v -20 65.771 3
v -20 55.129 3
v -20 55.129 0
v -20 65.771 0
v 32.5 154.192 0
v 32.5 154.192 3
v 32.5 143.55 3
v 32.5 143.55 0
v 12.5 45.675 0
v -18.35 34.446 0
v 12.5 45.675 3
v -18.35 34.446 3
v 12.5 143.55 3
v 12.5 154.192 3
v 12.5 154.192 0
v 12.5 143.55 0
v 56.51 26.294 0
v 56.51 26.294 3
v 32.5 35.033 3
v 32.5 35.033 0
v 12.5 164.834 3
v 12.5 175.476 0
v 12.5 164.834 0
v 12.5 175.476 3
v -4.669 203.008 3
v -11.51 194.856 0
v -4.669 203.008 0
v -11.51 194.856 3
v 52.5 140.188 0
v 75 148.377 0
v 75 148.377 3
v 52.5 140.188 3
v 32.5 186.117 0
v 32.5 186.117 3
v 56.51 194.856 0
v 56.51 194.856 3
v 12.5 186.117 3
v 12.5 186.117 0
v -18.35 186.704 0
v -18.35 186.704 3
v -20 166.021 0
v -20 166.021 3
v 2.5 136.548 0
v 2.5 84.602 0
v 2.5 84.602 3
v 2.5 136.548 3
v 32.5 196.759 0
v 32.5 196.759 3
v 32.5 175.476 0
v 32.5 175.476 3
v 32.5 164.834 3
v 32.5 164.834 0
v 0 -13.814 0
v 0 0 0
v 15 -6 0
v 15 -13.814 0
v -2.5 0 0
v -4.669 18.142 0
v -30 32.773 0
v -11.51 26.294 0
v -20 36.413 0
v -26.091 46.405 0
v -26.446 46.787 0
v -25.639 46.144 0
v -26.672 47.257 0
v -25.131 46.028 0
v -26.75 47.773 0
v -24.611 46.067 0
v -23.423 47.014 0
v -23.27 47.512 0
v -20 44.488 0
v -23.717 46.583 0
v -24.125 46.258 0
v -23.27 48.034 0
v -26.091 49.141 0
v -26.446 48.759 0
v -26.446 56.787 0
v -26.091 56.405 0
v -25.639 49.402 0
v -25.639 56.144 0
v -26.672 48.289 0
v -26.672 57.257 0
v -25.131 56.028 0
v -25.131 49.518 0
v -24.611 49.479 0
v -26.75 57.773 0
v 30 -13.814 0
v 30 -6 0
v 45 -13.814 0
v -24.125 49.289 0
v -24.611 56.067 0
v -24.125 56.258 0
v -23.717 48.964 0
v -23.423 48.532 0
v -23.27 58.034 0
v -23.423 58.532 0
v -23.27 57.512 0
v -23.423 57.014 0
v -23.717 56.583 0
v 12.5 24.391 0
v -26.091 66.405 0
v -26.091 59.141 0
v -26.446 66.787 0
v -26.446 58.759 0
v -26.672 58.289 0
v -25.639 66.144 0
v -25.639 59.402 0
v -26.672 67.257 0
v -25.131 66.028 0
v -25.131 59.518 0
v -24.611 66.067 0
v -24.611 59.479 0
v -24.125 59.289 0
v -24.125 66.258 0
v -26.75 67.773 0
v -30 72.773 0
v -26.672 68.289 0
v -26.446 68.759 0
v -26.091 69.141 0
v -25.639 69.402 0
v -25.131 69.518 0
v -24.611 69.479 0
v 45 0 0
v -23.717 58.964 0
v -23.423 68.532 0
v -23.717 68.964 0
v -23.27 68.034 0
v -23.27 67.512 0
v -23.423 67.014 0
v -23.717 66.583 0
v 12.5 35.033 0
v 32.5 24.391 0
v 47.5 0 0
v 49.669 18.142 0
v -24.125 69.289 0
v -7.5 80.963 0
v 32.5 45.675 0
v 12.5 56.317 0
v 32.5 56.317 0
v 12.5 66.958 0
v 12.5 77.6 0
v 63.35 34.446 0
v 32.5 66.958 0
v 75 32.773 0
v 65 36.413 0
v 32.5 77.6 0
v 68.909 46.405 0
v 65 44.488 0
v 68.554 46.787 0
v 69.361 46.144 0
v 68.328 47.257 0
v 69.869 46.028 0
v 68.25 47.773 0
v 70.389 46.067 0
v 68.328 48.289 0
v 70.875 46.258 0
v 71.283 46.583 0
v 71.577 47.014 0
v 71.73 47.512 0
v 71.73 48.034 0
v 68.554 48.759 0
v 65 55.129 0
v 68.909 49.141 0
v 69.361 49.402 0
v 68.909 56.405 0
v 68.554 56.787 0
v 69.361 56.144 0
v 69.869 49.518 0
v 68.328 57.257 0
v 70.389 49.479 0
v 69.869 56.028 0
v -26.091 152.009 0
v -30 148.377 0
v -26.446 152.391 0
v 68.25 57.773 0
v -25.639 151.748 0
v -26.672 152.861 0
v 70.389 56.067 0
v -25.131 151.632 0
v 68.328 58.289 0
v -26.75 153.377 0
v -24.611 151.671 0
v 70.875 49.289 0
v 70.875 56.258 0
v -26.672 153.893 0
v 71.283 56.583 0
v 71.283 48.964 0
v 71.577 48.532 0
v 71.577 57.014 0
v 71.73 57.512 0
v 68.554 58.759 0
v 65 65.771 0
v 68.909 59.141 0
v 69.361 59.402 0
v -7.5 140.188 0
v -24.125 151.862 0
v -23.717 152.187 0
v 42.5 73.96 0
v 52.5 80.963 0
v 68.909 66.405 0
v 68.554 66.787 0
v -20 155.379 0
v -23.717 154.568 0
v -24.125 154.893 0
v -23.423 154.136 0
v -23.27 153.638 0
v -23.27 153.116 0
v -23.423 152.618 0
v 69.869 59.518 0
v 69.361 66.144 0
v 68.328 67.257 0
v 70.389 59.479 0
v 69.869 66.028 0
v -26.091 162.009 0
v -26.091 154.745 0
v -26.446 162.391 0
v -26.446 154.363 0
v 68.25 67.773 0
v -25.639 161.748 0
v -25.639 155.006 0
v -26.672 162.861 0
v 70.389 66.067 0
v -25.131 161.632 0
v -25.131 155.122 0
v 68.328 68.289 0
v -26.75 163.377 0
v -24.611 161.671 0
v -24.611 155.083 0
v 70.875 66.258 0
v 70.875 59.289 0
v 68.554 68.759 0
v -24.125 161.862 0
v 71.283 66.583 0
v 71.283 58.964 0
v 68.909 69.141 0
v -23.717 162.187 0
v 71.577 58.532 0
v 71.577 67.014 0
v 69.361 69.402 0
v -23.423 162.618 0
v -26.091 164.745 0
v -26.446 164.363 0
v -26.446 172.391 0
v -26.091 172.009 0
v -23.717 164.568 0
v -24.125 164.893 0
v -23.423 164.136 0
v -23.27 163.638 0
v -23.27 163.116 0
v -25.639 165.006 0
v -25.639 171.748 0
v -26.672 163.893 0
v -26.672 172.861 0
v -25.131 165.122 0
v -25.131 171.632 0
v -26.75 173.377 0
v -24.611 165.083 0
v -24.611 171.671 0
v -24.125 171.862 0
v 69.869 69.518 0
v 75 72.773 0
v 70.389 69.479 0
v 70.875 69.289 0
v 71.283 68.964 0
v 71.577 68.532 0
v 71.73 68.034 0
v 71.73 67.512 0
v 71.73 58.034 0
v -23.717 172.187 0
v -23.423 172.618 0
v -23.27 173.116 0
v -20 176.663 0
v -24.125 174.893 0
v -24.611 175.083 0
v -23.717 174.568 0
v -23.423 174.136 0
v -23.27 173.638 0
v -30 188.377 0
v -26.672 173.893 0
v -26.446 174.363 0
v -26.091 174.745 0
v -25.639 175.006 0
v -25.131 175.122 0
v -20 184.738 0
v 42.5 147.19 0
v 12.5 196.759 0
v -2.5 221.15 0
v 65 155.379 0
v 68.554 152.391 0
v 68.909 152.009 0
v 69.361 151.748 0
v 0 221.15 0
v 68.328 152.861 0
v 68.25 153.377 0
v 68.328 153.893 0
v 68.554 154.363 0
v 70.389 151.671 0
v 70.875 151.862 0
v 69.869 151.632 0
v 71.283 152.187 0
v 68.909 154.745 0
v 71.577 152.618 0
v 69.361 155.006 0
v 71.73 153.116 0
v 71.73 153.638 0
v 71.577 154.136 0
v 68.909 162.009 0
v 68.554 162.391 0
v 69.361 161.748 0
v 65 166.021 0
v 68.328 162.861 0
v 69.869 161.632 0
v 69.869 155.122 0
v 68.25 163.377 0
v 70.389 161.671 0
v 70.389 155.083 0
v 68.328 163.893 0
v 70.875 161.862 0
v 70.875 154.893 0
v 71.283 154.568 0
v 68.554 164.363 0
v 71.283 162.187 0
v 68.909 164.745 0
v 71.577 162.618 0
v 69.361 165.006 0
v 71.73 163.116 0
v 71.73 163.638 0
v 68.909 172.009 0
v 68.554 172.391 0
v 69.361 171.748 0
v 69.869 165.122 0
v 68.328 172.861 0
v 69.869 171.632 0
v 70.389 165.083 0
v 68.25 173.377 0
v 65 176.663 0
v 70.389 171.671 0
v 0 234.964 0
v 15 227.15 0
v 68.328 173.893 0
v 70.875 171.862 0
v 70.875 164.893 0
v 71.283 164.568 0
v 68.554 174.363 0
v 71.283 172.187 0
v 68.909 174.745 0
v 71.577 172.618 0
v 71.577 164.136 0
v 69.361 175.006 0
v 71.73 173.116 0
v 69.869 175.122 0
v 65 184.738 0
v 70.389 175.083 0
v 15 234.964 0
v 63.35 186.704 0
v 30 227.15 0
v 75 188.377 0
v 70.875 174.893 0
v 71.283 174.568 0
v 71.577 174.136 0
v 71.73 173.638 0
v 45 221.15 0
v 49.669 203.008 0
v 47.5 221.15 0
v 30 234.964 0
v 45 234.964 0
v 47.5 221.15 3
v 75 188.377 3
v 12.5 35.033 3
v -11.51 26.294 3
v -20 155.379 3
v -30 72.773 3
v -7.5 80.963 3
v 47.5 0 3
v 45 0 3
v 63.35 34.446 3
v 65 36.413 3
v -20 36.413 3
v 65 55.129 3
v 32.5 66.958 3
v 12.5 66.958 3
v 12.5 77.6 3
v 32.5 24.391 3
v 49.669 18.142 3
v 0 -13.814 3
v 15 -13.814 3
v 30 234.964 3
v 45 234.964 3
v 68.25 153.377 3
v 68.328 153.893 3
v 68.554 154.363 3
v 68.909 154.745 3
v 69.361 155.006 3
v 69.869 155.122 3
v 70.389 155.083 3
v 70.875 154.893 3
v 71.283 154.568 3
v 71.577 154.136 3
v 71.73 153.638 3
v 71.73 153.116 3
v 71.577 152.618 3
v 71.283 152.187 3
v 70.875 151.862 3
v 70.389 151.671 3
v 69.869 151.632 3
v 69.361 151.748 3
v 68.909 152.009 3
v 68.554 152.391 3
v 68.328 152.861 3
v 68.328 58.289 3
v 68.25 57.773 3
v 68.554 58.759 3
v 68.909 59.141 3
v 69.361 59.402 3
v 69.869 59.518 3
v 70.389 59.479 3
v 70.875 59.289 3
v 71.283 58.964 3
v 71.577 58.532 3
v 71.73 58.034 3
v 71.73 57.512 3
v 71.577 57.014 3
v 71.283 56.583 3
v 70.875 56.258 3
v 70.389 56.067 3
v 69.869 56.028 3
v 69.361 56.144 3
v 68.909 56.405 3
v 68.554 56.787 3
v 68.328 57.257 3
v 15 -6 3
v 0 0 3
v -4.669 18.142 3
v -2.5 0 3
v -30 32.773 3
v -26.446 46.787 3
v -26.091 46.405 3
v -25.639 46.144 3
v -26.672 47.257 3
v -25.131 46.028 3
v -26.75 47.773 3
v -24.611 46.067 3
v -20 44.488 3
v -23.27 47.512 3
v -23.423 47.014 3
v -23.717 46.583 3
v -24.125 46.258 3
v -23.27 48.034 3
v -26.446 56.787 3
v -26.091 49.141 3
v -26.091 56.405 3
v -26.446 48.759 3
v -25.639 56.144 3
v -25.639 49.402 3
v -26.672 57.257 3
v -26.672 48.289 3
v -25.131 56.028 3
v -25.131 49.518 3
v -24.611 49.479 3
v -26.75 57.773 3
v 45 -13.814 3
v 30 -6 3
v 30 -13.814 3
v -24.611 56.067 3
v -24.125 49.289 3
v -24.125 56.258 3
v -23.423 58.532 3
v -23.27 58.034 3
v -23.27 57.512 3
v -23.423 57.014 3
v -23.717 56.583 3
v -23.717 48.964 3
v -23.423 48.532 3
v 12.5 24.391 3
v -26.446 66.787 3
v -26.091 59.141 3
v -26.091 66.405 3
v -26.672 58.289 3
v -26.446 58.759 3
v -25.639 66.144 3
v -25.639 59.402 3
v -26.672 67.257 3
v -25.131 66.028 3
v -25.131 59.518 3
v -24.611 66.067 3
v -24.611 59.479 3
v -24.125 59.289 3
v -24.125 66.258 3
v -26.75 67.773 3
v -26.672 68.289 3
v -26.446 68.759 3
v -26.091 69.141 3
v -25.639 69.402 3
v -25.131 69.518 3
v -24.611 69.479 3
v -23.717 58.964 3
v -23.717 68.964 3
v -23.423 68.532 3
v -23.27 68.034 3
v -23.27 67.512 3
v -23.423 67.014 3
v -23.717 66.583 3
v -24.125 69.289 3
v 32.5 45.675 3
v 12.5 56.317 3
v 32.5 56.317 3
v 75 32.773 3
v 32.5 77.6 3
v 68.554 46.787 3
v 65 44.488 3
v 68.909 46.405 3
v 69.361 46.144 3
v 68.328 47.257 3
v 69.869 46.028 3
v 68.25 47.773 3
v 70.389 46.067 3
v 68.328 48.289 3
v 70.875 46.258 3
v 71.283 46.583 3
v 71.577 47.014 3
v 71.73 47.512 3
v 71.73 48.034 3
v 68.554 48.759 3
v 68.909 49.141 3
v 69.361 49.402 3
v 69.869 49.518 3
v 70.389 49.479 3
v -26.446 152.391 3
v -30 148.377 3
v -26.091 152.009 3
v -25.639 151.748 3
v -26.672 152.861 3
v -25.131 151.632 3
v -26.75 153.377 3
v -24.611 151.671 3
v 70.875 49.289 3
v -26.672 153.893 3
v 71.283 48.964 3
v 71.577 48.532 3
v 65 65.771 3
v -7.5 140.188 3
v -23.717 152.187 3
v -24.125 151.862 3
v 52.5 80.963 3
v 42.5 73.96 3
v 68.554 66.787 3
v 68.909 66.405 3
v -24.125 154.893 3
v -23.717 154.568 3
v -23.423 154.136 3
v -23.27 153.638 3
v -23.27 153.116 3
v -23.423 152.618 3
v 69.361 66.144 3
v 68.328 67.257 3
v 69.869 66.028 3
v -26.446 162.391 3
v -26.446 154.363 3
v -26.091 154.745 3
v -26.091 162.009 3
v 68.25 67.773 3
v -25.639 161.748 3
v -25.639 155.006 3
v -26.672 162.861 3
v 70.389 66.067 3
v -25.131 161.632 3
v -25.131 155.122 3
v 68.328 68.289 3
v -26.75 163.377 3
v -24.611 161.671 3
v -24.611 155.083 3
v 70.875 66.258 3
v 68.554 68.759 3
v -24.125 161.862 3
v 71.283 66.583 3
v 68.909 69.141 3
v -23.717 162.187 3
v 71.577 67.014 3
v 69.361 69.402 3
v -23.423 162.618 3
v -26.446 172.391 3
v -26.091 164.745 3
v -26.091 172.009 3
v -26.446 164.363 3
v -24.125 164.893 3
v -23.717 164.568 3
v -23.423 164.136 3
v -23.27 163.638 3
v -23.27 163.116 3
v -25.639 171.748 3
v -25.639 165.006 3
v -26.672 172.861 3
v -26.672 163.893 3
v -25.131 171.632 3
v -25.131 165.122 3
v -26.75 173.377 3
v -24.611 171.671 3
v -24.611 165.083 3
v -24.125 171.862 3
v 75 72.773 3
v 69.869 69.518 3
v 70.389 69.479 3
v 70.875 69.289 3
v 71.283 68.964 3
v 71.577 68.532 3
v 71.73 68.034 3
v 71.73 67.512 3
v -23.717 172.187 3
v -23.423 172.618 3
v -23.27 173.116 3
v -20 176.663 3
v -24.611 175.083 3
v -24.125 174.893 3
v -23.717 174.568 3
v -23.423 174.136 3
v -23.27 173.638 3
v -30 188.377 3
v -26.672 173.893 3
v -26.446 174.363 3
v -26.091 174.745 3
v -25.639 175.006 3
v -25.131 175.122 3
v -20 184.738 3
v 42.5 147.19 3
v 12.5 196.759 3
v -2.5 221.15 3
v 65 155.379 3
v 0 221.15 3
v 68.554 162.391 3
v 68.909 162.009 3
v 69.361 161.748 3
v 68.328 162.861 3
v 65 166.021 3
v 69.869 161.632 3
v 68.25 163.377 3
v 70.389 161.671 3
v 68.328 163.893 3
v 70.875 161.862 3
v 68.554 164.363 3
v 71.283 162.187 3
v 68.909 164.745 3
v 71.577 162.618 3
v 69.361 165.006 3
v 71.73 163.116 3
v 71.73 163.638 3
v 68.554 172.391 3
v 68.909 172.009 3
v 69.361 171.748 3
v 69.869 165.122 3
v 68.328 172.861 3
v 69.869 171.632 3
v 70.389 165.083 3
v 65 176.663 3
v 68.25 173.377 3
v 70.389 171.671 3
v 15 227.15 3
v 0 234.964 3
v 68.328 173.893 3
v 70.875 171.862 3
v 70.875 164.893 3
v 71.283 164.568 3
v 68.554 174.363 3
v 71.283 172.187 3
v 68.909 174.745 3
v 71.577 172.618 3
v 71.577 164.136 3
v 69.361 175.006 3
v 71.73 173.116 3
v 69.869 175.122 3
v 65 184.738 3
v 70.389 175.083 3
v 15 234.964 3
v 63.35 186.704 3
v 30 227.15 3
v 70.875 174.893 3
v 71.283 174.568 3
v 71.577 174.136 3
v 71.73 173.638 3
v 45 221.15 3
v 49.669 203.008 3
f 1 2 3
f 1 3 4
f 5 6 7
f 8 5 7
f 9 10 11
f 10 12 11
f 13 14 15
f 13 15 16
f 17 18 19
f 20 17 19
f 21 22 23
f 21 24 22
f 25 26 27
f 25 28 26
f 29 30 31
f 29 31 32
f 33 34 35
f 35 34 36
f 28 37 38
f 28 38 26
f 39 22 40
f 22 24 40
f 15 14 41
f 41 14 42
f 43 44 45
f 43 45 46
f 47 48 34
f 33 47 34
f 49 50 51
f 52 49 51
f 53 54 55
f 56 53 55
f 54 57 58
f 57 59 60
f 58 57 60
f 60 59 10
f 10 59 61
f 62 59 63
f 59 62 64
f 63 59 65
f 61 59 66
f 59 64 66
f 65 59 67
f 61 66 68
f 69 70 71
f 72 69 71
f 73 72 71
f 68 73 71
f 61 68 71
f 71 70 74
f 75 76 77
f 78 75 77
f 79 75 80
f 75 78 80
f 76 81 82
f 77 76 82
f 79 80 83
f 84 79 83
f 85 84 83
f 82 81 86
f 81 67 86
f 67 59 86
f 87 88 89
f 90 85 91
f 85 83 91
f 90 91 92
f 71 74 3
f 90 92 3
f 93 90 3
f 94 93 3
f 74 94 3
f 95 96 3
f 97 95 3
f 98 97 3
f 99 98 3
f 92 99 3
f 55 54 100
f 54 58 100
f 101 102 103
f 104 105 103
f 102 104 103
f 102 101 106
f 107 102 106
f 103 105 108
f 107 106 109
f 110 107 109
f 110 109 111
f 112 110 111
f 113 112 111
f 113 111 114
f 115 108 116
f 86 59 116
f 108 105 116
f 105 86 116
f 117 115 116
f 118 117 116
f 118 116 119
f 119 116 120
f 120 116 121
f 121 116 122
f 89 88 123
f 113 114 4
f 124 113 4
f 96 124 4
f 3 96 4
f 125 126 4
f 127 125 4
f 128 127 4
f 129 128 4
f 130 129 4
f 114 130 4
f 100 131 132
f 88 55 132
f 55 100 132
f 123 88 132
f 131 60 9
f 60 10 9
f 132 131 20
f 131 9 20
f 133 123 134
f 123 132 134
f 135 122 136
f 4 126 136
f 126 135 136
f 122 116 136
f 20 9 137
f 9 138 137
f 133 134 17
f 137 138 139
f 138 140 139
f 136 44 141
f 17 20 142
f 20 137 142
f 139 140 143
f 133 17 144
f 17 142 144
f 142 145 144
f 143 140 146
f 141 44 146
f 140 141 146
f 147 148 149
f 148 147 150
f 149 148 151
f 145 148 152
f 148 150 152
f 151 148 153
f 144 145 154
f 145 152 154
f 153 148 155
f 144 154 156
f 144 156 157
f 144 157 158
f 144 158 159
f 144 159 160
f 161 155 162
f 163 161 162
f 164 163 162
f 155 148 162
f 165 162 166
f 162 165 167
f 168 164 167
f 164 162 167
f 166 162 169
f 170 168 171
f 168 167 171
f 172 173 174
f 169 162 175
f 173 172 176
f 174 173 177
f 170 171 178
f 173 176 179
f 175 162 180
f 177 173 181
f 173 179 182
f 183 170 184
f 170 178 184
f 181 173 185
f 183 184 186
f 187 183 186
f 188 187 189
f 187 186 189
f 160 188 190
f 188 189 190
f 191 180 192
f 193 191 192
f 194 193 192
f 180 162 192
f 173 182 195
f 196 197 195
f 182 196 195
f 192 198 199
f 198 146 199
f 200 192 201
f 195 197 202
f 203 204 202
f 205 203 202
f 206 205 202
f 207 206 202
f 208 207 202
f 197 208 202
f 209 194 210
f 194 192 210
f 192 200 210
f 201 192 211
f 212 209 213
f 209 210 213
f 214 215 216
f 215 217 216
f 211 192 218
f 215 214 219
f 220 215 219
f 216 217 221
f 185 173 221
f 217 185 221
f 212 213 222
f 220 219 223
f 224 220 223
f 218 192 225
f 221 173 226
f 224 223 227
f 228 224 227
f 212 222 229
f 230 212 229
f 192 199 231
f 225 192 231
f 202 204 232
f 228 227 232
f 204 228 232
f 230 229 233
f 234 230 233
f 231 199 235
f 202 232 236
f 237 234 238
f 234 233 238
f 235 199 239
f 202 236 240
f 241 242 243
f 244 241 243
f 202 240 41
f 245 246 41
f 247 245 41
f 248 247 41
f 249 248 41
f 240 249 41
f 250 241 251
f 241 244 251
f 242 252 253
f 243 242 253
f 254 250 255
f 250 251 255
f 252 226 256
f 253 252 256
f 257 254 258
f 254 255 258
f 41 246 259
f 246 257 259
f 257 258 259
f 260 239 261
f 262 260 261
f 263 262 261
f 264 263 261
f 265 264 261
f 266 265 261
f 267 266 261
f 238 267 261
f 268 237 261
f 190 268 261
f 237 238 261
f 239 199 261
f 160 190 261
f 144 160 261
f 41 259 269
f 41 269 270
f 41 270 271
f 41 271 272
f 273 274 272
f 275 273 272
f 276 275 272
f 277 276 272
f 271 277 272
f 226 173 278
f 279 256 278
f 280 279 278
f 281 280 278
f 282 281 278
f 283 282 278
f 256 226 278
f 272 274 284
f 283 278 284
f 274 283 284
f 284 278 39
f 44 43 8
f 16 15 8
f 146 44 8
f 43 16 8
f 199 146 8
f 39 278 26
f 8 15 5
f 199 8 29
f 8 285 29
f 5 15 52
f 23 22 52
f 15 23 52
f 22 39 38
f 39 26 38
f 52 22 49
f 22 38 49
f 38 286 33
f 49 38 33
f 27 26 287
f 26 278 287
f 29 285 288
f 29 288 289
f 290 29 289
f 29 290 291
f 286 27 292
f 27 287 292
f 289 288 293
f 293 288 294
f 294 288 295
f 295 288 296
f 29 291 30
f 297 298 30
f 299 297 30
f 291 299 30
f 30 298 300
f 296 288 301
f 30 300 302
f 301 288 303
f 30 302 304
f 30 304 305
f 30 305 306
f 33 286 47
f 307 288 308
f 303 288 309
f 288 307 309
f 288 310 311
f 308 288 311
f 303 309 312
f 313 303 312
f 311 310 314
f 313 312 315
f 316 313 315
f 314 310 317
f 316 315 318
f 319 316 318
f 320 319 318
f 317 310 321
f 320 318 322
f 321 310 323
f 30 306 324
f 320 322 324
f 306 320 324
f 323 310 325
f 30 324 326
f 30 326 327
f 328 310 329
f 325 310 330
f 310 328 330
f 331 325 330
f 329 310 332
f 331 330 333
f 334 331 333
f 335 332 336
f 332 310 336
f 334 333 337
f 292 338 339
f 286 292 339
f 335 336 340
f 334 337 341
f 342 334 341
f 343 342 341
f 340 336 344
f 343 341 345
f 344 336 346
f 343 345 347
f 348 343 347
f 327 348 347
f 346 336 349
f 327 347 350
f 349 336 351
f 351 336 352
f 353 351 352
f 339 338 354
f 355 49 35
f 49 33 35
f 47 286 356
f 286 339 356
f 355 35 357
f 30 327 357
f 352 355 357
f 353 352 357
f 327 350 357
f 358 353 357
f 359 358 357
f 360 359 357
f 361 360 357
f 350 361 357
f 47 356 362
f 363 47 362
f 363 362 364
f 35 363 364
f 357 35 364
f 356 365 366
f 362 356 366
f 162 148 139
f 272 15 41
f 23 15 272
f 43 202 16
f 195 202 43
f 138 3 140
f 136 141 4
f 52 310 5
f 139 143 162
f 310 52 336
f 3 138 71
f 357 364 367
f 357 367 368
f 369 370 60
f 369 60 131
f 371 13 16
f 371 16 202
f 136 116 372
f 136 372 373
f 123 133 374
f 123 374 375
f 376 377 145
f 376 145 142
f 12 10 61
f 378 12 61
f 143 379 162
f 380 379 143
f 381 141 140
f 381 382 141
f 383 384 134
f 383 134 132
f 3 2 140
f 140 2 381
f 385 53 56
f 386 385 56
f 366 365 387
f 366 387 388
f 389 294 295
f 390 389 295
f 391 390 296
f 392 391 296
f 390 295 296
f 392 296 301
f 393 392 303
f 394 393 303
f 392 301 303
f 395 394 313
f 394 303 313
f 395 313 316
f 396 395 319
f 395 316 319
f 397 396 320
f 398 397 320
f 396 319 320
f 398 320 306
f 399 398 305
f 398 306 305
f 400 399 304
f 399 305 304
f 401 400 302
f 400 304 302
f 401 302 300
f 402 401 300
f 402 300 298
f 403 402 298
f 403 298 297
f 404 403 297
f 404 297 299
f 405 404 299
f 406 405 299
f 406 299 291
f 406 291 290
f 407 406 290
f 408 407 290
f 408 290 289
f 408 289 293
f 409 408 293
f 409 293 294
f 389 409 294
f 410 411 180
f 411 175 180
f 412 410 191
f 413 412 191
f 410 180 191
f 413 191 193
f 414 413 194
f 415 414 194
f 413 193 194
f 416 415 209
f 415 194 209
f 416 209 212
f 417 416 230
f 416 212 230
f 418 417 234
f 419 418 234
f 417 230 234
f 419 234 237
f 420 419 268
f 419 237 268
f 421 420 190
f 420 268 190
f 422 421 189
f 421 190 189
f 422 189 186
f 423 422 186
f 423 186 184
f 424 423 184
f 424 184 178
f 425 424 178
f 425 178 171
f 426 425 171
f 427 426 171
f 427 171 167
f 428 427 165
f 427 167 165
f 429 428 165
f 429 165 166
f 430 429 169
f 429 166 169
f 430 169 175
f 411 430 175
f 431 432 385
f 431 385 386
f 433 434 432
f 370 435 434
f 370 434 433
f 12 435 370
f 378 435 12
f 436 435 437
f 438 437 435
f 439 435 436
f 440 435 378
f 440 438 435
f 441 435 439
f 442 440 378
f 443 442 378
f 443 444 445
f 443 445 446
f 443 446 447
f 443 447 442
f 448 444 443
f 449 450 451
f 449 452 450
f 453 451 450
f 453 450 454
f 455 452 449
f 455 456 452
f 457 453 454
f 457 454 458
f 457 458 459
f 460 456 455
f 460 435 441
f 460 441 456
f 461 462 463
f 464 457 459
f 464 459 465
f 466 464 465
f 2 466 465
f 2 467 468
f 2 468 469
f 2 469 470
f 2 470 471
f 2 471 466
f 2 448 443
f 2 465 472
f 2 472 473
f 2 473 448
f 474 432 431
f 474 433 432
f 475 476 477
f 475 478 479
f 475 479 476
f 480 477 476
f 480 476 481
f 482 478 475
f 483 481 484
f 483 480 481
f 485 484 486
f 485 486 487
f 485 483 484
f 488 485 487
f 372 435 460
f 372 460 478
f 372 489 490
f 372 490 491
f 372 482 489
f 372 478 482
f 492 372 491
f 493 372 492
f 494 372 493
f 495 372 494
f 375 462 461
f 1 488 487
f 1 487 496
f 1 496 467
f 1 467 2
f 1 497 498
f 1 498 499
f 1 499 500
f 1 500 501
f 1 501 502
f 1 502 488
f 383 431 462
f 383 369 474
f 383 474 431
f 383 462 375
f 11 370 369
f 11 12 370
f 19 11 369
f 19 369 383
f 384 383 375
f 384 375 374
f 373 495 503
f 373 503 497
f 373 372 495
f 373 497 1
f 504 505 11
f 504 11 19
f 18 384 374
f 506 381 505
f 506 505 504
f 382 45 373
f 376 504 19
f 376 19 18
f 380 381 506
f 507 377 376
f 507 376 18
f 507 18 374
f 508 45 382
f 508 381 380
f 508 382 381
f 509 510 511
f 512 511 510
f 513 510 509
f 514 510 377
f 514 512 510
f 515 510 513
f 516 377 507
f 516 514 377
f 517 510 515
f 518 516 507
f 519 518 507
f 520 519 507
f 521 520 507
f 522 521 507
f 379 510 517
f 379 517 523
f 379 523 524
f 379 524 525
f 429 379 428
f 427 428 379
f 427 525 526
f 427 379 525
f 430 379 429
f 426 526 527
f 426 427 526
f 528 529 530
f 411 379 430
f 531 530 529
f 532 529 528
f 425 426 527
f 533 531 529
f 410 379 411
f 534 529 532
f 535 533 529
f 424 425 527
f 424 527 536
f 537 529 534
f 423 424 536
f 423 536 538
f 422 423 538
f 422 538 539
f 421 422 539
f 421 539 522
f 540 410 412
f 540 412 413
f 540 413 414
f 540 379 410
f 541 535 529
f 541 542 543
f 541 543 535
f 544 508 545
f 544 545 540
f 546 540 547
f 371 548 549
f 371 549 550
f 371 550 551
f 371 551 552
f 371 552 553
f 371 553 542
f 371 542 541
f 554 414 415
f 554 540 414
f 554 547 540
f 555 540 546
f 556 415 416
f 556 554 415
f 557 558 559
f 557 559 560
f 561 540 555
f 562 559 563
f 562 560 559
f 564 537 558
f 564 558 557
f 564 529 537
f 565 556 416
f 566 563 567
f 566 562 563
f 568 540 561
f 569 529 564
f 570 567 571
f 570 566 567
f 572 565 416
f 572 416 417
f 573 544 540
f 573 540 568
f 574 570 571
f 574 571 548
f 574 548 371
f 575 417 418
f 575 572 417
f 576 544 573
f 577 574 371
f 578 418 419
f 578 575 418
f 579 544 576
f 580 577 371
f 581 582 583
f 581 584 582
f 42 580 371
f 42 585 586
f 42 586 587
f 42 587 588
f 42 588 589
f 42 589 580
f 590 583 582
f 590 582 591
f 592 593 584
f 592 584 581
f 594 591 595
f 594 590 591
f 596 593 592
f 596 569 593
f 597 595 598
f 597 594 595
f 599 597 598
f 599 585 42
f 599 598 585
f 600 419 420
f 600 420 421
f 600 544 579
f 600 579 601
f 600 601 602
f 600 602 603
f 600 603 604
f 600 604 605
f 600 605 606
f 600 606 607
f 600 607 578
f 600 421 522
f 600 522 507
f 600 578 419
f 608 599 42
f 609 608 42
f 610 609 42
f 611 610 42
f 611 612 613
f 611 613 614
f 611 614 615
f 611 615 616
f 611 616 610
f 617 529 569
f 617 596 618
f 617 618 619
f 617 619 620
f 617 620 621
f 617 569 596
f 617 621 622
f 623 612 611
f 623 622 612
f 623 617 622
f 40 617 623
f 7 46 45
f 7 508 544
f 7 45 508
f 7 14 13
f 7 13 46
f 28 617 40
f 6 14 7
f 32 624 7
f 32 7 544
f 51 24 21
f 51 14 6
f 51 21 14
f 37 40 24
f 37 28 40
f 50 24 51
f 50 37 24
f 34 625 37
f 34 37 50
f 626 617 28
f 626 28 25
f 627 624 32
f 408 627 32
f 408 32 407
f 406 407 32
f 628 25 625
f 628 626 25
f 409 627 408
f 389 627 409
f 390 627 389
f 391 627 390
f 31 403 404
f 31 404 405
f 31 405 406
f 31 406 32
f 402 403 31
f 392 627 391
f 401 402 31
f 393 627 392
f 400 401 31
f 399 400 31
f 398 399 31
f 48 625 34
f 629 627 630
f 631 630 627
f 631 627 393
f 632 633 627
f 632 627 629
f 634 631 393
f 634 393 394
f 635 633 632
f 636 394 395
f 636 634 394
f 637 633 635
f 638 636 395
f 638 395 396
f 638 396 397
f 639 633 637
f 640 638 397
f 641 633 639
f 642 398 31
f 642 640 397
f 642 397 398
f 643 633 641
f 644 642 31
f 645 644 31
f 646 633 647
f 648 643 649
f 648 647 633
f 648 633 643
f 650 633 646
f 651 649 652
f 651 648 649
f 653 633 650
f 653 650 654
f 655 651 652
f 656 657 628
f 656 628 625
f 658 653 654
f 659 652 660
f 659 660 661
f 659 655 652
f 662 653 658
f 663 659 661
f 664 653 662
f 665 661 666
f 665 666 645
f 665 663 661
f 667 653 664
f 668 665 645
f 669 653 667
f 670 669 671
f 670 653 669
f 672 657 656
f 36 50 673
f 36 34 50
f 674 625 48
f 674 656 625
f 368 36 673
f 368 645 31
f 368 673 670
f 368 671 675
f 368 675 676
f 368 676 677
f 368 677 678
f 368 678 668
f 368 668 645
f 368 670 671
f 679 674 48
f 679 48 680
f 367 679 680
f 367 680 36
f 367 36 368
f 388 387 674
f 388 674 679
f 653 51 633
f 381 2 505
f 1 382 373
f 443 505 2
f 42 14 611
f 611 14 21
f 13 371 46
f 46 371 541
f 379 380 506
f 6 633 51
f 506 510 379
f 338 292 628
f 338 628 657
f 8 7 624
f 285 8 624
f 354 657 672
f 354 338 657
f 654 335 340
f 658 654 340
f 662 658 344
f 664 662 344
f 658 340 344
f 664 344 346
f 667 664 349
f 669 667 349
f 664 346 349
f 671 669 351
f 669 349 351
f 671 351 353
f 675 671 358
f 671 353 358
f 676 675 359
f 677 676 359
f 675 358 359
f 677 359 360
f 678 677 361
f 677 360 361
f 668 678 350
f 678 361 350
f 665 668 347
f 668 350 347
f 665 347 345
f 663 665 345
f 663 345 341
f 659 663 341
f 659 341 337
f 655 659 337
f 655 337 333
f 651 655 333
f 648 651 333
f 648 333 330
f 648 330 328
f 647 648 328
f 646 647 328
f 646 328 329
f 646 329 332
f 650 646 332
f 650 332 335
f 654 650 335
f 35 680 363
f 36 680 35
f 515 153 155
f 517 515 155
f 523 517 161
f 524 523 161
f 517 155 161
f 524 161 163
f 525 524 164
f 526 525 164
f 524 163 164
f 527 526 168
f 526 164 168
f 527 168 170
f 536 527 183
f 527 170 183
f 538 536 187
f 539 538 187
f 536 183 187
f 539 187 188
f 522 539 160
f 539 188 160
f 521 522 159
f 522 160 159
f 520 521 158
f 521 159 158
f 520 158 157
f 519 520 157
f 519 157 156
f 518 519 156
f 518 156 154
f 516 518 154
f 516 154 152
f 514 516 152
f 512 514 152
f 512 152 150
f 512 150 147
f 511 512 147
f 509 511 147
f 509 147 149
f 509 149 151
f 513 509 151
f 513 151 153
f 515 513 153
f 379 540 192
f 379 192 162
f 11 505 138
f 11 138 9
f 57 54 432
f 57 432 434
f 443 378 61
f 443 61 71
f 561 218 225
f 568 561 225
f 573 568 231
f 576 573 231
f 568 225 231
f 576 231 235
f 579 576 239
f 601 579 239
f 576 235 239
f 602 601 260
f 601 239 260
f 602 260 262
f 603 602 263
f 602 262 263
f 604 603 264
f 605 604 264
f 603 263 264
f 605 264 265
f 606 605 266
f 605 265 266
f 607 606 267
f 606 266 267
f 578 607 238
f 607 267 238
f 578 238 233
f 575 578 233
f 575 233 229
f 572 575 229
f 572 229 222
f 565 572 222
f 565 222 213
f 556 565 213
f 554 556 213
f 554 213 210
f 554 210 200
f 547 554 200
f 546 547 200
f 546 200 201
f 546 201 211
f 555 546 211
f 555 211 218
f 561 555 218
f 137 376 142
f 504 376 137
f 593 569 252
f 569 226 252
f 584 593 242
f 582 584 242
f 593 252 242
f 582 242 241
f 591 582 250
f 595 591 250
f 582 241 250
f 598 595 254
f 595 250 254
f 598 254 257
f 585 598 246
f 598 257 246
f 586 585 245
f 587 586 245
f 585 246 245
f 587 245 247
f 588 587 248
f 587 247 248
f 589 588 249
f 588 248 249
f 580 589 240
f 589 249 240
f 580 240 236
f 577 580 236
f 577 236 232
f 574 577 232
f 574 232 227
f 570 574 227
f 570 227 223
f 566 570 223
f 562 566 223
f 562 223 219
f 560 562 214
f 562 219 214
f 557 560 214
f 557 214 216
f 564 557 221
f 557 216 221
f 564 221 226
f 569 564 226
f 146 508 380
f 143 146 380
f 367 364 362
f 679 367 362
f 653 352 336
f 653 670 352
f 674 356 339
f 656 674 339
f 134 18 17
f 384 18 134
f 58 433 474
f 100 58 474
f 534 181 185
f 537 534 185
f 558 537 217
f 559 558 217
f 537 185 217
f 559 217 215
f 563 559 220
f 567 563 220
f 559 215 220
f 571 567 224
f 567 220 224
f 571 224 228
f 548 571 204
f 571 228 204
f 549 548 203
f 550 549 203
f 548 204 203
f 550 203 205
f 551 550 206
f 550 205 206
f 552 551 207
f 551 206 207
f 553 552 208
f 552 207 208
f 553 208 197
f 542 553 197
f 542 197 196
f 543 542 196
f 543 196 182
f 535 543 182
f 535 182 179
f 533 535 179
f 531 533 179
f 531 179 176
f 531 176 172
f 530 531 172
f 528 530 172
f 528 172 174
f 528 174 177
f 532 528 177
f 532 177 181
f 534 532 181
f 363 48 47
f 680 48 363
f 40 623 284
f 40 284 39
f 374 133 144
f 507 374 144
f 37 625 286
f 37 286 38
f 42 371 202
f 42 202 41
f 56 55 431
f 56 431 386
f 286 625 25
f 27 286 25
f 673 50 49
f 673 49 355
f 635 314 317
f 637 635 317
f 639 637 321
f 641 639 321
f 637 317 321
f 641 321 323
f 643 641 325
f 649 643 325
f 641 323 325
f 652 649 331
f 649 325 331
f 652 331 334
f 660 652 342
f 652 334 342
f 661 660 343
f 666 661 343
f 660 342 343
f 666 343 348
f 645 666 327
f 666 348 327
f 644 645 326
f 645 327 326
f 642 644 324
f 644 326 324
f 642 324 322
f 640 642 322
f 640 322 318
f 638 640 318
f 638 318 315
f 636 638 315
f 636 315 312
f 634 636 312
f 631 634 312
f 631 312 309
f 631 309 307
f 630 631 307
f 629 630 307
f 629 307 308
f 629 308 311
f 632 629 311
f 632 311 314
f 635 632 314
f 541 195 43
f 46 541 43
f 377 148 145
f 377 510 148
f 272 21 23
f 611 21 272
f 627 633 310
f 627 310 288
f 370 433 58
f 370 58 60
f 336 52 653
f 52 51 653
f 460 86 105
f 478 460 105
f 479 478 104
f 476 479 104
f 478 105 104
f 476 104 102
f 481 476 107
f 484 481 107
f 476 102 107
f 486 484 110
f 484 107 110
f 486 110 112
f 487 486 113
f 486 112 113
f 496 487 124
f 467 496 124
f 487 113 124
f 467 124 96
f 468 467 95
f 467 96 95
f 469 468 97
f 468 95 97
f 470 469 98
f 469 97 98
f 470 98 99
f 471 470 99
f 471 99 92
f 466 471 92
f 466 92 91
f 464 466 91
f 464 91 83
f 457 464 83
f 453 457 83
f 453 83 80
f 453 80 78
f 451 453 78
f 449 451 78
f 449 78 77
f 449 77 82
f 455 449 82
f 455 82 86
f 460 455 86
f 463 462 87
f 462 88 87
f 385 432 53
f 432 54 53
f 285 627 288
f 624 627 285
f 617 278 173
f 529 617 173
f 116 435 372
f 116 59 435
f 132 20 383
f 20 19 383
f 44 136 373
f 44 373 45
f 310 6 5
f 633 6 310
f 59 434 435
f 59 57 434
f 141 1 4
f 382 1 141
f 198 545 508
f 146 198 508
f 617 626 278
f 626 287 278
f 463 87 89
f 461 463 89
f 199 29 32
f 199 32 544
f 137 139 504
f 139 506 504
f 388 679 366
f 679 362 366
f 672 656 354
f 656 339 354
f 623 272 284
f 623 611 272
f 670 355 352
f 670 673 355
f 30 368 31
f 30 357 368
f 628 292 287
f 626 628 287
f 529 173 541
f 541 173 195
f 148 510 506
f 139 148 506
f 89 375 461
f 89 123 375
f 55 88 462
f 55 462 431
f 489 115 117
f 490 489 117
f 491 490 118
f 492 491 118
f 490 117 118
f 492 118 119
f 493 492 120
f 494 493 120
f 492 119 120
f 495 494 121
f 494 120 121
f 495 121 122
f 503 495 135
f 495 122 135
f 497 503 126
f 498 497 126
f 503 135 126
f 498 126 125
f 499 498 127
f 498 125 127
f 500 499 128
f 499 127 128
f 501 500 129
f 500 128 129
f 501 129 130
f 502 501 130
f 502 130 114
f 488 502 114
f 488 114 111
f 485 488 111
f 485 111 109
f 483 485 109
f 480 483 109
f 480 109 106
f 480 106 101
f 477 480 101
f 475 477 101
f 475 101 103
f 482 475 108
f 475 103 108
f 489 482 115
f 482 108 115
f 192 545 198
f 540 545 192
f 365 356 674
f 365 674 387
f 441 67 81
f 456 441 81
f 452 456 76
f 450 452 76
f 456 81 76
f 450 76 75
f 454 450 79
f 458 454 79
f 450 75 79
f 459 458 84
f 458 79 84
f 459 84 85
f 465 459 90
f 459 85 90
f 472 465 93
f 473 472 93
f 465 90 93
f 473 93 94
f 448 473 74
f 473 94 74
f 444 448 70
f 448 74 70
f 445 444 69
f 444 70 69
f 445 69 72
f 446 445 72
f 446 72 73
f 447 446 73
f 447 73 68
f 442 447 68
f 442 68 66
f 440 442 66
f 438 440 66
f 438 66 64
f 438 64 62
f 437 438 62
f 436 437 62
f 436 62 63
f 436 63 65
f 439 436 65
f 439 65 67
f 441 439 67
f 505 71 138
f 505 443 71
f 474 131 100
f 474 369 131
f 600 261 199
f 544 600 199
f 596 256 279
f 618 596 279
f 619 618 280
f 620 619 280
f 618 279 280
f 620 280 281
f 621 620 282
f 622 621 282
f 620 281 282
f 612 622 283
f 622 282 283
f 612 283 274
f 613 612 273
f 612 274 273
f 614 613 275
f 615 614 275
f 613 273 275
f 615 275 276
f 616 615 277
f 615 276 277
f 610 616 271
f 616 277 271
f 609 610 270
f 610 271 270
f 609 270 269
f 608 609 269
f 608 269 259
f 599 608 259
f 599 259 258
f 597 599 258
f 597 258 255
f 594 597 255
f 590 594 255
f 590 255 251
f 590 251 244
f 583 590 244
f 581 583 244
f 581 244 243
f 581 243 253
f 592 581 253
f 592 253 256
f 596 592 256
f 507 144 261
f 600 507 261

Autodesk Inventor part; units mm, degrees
ref_plane "YZ Plane" through (0, 0, 0) normal (1, 0, 0) x (0, 1, 0)
ref_plane "XZ Plane" through (0, 0, 0) normal (0, 1, 0) x (-1, 0, 0)
ref_plane "XY Plane" through (0, 0, 0) normal (0, 0, 1) x (1, 0, 0)
sketch "Sketch1" plane through (0, 0, 0) normal (0, 0, 1) x (1, 0, 0)
  line L0 (0, -13.8137) -> (15, -13.8137) projected
  line L1 (0, 0) -> (0, -13.8137) projected
  line L2 (45, 0) -> (0, 0) projected
  line L3 (45, 0) -> (45, -13.8137) projected
  line L4 (30, -13.8137) -> (45, -13.8137) projected
  line L5 (30, -6) -> (30, -13.8137) projected
  line L6 (30, -6) -> (15, -6) projected
  line L7 (15, -6) -> (15, -13.8137) projected
  line L8 (-2.5, 0) -> (-2.5, -11.3137) projected
  line L9 (47.5, 0) -> (-2.5, 0) projected
  line L10 (47.5, 0) -> (75, 32.7732)
  line L11 (47.5, 0) -> (90.2824, 0) construction
  line L12 (75, 32.7732) -> (75, 72.7732)
  line L13 (75, 72.7732) -> (52.5, 80.9626)
  line L14 (52.5, 80.9626) -> (52.5, 110.5752)
  line L15 (22.5, -6) -> (22.5, 110.5752)
  line L16 (-10.9317, 221.1504) -> (1.7683, 221.1504) construction
  line L17 (22.5, 0) -> (22.5, 221.1504)
  line L18 (22.5, 110.5752) -> (52.5, 110.5752) construction
  line L19 (-2.5, 0) -> (-30, 32.7732)
  line L20 (-30, 32.7732) -> (-30, 72.7732)
  line L21 (-30, 72.7732) -> (-7.5, 80.9626)
  line L22 (-7.5, 80.9626) -> (2.5, 84.6023)
  line L23 (2.5, 84.6023) -> (2.5, 110.5752)
  line L24 (22.5, 110.5752) -> (2.5, 110.5752) construction
  line L25 (47.5, 221.1504) -> (75, 188.3772)
  line L26 (75, 188.3772) -> (75, 148.3772)
  line L27 (75, 148.3772) -> (52.5, 140.1879)
  line L28 (52.5, 140.1879) -> (52.5, 110.5752)
  line L29 (-30, 148.3772) -> (-7.5, 140.1879)
  line L30 (-30, 188.3772) -> (-30, 148.3772)
  line L31 (-2.5, 221.1504) -> (-30, 188.3772)
  line L32 (-7.5, 140.1879) -> (2.5, 136.5482)
  line L33 (2.5, 136.5482) -> (2.5, 110.5752)
  line L34 (0, 234.9641) -> (15, 234.9641)
  line L35 (0, 221.1504) -> (0, 234.9641)
  line L36 (45, 221.1504) -> (45, 234.9641)
  line L37 (30, 234.9641) -> (45, 234.9641)
  line L38 (30, 227.1504) -> (30, 234.9641)
  line L39 (30, 227.1504) -> (15, 227.1504)
  line L40 (15, 227.1504) -> (15, 234.9641)
  line L41 (47.5, 221.1504) -> (-2.5, 221.1504)
  line L42 (75, 40) -> (75, 44.6908)
  dimension "d0" = 50
  dimension "d1" = 110
  dimension "d2" = 30
  dimension "d3" = 40
  dimension "d4" = 30
  dimension "d5" = 20
extrude "Extrusion1" add sketch "Sketch1" along normal blind 3
sketch "Sketch2" plane through (0, 0, 3) normal (0, 0, 1) x (1, 0, 0)
  line L0 (45, -13.8137) -> (45, 0) projected
  line L1 (45, 0) -> (47.5, 0) projected
  line L2 (47.5, 0) -> (75, 32.7732) projected
  line L3 (75, 32.7732) -> (75, 72.7732) projected
  line L4 (75, 72.7732) -> (52.5, 80.9626) projected
  line L5 (52.5, 80.9626) -> (52.5, 140.1879) projected
  line L6 (52.5, 140.1879) -> (75, 148.3772) projected
  line L7 (75, 148.3772) -> (75, 188.3772) projected
  line L8 (75, 188.3772) -> (47.5, 221.1504) projected
  line L9 (47.5, 221.1504) -> (45, 221.1504) projected
  line L10 (45, 221.1504) -> (45, 234.9641) projected
  line L11 (45, 234.9641) -> (30, 234.9641) projected
  line L12 (30, 234.9641) -> (30, 227.1504) projected
  line L13 (30, 227.1504) -> (15, 227.1504) projected
  line L14 (15, 227.1504) -> (15, 234.9641) projected
  line L15 (15, 234.9641) -> (0, 234.9641) projected
  line L16 (0, 234.9641) -> (0, 221.1504) projected
  line L17 (0, 221.1504) -> (-2.5, 221.1504) projected
  line L18 (-2.5, 221.1504) -> (-30, 188.3772) projected
  line L19 (-30, 188.3772) -> (-30, 148.3772) projected
  line L20 (-30, 148.3772) -> (2.5, 136.5482) projected
  line L21 (2.5, 136.5482) -> (2.5, 84.6023) projected
  line L22 (2.5, 84.6023) -> (-30, 72.7732) projected
  line L23 (-30, 72.7732) -> (-30, 32.7732) projected
  line L24 (-30, 32.7732) -> (-2.5, 0) projected
  line L25 (-2.5, 0) -> (0, 0) projected
  line L26 (0, 0) -> (0, -13.8137) projected
  line L27 (0, -13.8137) -> (15, -13.8137) projected
  line L28 (15, -13.8137) -> (15, -6) projected
  line L29 (15, -6) -> (30, -6) projected
  line L30 (30, -6) -> (30, -13.8137) projected
  line L31 (30, -13.8137) -> (45, -13.8137) projected
  line L32 (-20, 36.4129) -> (-20, 65.7711)
  line L33 (-20, 65.7711) -> (12.5, 77.6002)
  line L34 (12.5, 77.6002) -> (12.5, 143.5503)
  line L35 (12.5, 143.5503) -> (-20, 155.3793)
  line L36 (-20, 155.3793) -> (-20, 184.7375)
  line L37 (-20, 184.7375) -> (2.1631, 211.1504)
  line L38 (2.1631, 211.1504) -> (10, 211.1504)
  line L39 (10, 211.1504) -> (10, 217.1504)
  line L40 (10, 217.1504) -> (35, 217.1504)
  line L41 (35, 217.1504) -> (35, 211.1504)
  line L42 (35, 211.1504) -> (42.8369, 211.1504)
  line L43 (42.8369, 211.1504) -> (65, 184.7375)
  line L44 (65, 184.7375) -> (65, 155.3793)
  line L45 (65, 155.3793) -> (42.5, 147.19)
  line L46 (42.5, 147.19) -> (42.5, 73.9605)
  line L47 (42.5, 73.9605) -> (65, 65.7711)
  line L48 (65, 65.7711) -> (65, 36.4129)
  line L49 (65, 36.4129) -> (42.8369, 10)
  line L50 (42.8369, 10) -> (35, 10)
  line L51 (35, 10) -> (35, 4)
  line L52 (35, 4) -> (10, 4)
  line L53 (10, 4) -> (10, 10)
  line L54 (10, 10) -> (2.1631, 10)
  line L55 (2.1631, 10) -> (-20, 36.4129)
  line L56 (12.5, 77.6002) -> (12.5, 10)
  line L57 (12.5, 10) -> (10, 10)
  line L58 (22.5, 4) -> (22.5, 217.1504) construction
  line L59 (32.5, 77.6002) -> (32.5, 10)
  line L60 (32.5, 10) -> (35, 10)
  line L61 (32.5, 77.6002) -> (32.5, 211.1504)
  line L62 (32.5, 211.1504) -> (35, 211.1504)
  line L63 (12.5, 143.5503) -> (12.5, 211.1504)
  line L64 (12.5, 211.1504) -> (10, 211.1504)
  line L65 (-20, 55.1294) -> (12.5, 66.9584)
  line L66 (-25.1903, 42.5985) -> (12.5, 56.3166)
  line L67 (-18.3499, 34.4464) -> (12.5, 45.6748)
  line L68 (-11.5095, 26.2943) -> (12.5, 35.0331)
  line L69 (-4.6691, 18.1423) -> (12.5, 24.3913)
  line L70 (65, 55.1294) -> (32.5, 66.9584)
  line L71 (70.1903, 42.5985) -> (32.5, 56.3166)
  line L72 (63.3499, 34.4464) -> (32.5, 45.6748)
  line L73 (56.5095, 26.2943) -> (32.5, 35.0331)
  line L74 (49.6691, 18.1423) -> (32.5, 24.3913)
  line L75 (42.5, 73.9605) -> (32.5, 77.6002)
  point P0 (32.5, 66.9584)
  point P1 (65, 55.1294)
  point P2 (73.2901, 46.2927)
  point P3 (32.5, 56.3166)
  point P4 (32.5, 45.6748)
  point P5 (63.3499, 34.4464)
  point P6 (56.5095, 26.2943)
  point P7 (32.5, 35.0331)
  point P8 (32.5, 24.3913)
  point P9 (49.6691, 18.1423)
  point P10 (65, 44.4876)
  point P11 (-20, 44.4876)
  dimension "d8" = 10
  dimension "d9" = 10
  dimension "d10" = 10
  dimension "d11" = 10
  dimension "d12" = 10
  dimension "d13" = 10
extrude "Extrusion2" cut sketch "Sketch2" against normal blind 3 contours L32 L33 L56 L65 | L66 L56 L67 L55 L32 | L68 L56 L69 L55 | L75 L47 L48 L70 L59 | L71 L48 L49 L72 L59 | L74 L59 L73 L49
ref_plane "Work Plane1" through (0, 110.5752, 0) normal (0, 1, 0) x (1, 0, 0)
mirror "Mirror1" about plane through (0, 110.5752, 0) normal (0, 1, 0) of "Extrusion2"
sketch "Sketch3" plane through (0, 0, 0) normal (0, 0, -1) x (-1, 0, 0)
  line L0 (4.6691, 203.0082) -> (11.5095, 194.8561) projected
  line L1 (-32.5, 143.5503) -> (-65, 155.3793) projected
  line L2 (-65, 155.3793) -> (-65, 166.0211) projected
  line L3 (-56.5095, 194.8561) -> (-49.6691, 203.0082) projected
  line L4 (20, 166.0211) -> (20, 155.3793) projected
  line L5 (20, 155.3793) -> (-12.5, 143.5503) projected
  line L6 (11.5095, 26.2943) -> (4.6691, 18.1423) projected
  line L7 (-65, 55.1294) -> (-65, 65.7711) projected
  line L8 (-65, 65.7711) -> (-32.5, 77.6002) projected
  line L9 (-49.6691, 18.1423) -> (-56.5095, 26.2943) projected
  line L10 (-12.5, 77.6002) -> (20, 65.7711) projected
  line L11 (20, 65.7711) -> (20, 55.1294) projected
  line L12 (-45, -13.8137) -> (-45, 0) projected
  line L13 (-30, -13.8137) -> (-45, -13.8137) projected
  line L14 (-30, -6) -> (-30, -13.8137) projected
  line L15 (-15, -6) -> (-30, -6) projected
  line L16 (-15, -13.8137) -> (-15, -6) projected
  line L17 (0, -13.8137) -> (-15, -13.8137) projected
  line L18 (0, 0) -> (0, -13.8137) projected
  line L19 (2.5, 0) -> (0, 0) projected
  line L20 (30, 32.7732) -> (2.5, 0) projected
  line L21 (30, 72.7732) -> (30, 32.7732) projected
  line L22 (-2.5, 84.6023) -> (30, 72.7732) projected
  line L23 (-2.5, 136.5482) -> (-2.5, 84.6023) projected
  line L24 (30, 148.3772) -> (-2.5, 136.5482) projected
  line L25 (30, 188.3772) -> (30, 148.3772) projected
  line L26 (2.5, 221.1504) -> (30, 188.3772) projected
  line L27 (0, 221.1504) -> (2.5, 221.1504) projected
  line L28 (0, 234.9641) -> (0, 221.1504) projected
  line L29 (-15, 234.9641) -> (0, 234.9641) projected
  line L30 (-15, 227.1504) -> (-15, 234.9641) projected
  line L31 (-30, 227.1504) -> (-15, 227.1504) projected
  line L32 (-30, 234.9641) -> (-30, 227.1504) projected
  line L33 (-45, 234.9641) -> (-30, 234.9641) projected
  line L34 (-45, 221.1504) -> (-45, 234.9641) projected
  line L35 (-47.5, 221.1504) -> (-45, 221.1504) projected
  line L36 (-75, 188.3772) -> (-47.5, 221.1504) projected
  line L37 (-75, 148.3772) -> (-75, 188.3772) projected
  line L38 (-52.5, 140.1879) -> (-75, 148.3772) projected
  line L39 (-52.5, 80.9626) -> (-52.5, 140.1879) projected
  line L40 (-75, 72.7732) -> (-52.5, 80.9626) projected
  line L41 (-75, 32.7732) -> (-75, 72.7732) projected
  line L42 (-47.5, 0) -> (-75, 32.7732) projected
  line L43 (-45, 0) -> (-47.5, 0) projected
  circle A0 centre (25, 67.7732) radius 1.75
  circle A1 centre (25, 57.7732) radius 1.75
  circle A2 centre (25, 47.7732) radius 1.75
  line L44 (-2.5, 136.5482) -> (-2.5, 84.6023) projected
  line L45 (-2.5, 110.5752) -> (-52.5, 110.5752)
  circle A3 centre (25, 153.3772) radius 1.75
  circle A4 centre (25, 163.3772) radius 1.75
  circle A5 centre (25, 173.3772) radius 1.75
  line L46 (-15, -6) -> (-30, -6) projected
  line L47 (-22.5, -6) -> (-22.5, 227.1504)
  line L48 (-30, 227.1504) -> (-15, 227.1504) projected
  circle A6 centre (-70, 67.7732) radius 1.75
  circle A7 centre (-70, 57.7732) radius 1.75
  circle A8 centre (-70, 47.7732) radius 1.75
  circle A9 centre (-70, 153.3772) radius 1.75
  circle A10 centre (-70, 163.3772) radius 1.75
  circle A11 centre (-70, 173.3772) radius 1.75
  line L49 (-12.5, 154.192) -> (20, 166.0211) projected
  line L50 (-12.5, 143.5503) -> (-12.5, 154.192) projected
  line L51 (-49.6691, 203.0082) -> (-32.5, 196.7591) projected
  line L52 (-32.5, 196.7591) -> (-32.5, 186.1174) projected
  line L53 (-32.5, 186.1174) -> (-56.5095, 194.8561) projected
  line L54 (-32.5, 154.192) -> (-32.5, 143.5503) projected
  line L55 (-65, 166.0211) -> (-32.5, 154.192) projected
  line L56 (11.5095, 194.8561) -> (-12.5, 186.1174) projected
  line L57 (-12.5, 186.1174) -> (-12.5, 196.7591) projected
  line L58 (-12.5, 196.7591) -> (4.6691, 203.0082) projected
  line L59 (20, 55.1294) -> (-12.5, 66.9584) projected
  line L60 (-12.5, 66.9584) -> (-12.5, 77.6002) projected
  line L61 (-32.5, 24.3913) -> (-49.6691, 18.1423) projected
  line L62 (-56.5095, 26.2943) -> (-32.5, 35.0331) projected
  line L63 (-32.5, 35.0331) -> (-32.5, 24.3913) projected
  line L64 (-32.5, 77.6002) -> (-32.5, 66.9584) projected
  line L65 (-32.5, 66.9584) -> (-65, 55.1294) projected
  line L66 (-12.5, 35.0331) -> (11.5095, 26.2943) projected
  line L67 (4.6691, 18.1423) -> (-12.5, 24.3913) projected
  line L68 (-12.5, 24.3913) -> (-12.5, 35.0331) projected
  dimension "d16" = 3.5
  dimension "d19" = 10
  dimension "d24" = 5
  dimension "d25" = 5
extrude "Extrusion3" cut sketch "Sketch3" against normal through all contours A0 | A1 | A2 | A3 | A4 | A5 | A6 | A7 | A8 | A9 | A10 | A11
properties part number "Backplane"
